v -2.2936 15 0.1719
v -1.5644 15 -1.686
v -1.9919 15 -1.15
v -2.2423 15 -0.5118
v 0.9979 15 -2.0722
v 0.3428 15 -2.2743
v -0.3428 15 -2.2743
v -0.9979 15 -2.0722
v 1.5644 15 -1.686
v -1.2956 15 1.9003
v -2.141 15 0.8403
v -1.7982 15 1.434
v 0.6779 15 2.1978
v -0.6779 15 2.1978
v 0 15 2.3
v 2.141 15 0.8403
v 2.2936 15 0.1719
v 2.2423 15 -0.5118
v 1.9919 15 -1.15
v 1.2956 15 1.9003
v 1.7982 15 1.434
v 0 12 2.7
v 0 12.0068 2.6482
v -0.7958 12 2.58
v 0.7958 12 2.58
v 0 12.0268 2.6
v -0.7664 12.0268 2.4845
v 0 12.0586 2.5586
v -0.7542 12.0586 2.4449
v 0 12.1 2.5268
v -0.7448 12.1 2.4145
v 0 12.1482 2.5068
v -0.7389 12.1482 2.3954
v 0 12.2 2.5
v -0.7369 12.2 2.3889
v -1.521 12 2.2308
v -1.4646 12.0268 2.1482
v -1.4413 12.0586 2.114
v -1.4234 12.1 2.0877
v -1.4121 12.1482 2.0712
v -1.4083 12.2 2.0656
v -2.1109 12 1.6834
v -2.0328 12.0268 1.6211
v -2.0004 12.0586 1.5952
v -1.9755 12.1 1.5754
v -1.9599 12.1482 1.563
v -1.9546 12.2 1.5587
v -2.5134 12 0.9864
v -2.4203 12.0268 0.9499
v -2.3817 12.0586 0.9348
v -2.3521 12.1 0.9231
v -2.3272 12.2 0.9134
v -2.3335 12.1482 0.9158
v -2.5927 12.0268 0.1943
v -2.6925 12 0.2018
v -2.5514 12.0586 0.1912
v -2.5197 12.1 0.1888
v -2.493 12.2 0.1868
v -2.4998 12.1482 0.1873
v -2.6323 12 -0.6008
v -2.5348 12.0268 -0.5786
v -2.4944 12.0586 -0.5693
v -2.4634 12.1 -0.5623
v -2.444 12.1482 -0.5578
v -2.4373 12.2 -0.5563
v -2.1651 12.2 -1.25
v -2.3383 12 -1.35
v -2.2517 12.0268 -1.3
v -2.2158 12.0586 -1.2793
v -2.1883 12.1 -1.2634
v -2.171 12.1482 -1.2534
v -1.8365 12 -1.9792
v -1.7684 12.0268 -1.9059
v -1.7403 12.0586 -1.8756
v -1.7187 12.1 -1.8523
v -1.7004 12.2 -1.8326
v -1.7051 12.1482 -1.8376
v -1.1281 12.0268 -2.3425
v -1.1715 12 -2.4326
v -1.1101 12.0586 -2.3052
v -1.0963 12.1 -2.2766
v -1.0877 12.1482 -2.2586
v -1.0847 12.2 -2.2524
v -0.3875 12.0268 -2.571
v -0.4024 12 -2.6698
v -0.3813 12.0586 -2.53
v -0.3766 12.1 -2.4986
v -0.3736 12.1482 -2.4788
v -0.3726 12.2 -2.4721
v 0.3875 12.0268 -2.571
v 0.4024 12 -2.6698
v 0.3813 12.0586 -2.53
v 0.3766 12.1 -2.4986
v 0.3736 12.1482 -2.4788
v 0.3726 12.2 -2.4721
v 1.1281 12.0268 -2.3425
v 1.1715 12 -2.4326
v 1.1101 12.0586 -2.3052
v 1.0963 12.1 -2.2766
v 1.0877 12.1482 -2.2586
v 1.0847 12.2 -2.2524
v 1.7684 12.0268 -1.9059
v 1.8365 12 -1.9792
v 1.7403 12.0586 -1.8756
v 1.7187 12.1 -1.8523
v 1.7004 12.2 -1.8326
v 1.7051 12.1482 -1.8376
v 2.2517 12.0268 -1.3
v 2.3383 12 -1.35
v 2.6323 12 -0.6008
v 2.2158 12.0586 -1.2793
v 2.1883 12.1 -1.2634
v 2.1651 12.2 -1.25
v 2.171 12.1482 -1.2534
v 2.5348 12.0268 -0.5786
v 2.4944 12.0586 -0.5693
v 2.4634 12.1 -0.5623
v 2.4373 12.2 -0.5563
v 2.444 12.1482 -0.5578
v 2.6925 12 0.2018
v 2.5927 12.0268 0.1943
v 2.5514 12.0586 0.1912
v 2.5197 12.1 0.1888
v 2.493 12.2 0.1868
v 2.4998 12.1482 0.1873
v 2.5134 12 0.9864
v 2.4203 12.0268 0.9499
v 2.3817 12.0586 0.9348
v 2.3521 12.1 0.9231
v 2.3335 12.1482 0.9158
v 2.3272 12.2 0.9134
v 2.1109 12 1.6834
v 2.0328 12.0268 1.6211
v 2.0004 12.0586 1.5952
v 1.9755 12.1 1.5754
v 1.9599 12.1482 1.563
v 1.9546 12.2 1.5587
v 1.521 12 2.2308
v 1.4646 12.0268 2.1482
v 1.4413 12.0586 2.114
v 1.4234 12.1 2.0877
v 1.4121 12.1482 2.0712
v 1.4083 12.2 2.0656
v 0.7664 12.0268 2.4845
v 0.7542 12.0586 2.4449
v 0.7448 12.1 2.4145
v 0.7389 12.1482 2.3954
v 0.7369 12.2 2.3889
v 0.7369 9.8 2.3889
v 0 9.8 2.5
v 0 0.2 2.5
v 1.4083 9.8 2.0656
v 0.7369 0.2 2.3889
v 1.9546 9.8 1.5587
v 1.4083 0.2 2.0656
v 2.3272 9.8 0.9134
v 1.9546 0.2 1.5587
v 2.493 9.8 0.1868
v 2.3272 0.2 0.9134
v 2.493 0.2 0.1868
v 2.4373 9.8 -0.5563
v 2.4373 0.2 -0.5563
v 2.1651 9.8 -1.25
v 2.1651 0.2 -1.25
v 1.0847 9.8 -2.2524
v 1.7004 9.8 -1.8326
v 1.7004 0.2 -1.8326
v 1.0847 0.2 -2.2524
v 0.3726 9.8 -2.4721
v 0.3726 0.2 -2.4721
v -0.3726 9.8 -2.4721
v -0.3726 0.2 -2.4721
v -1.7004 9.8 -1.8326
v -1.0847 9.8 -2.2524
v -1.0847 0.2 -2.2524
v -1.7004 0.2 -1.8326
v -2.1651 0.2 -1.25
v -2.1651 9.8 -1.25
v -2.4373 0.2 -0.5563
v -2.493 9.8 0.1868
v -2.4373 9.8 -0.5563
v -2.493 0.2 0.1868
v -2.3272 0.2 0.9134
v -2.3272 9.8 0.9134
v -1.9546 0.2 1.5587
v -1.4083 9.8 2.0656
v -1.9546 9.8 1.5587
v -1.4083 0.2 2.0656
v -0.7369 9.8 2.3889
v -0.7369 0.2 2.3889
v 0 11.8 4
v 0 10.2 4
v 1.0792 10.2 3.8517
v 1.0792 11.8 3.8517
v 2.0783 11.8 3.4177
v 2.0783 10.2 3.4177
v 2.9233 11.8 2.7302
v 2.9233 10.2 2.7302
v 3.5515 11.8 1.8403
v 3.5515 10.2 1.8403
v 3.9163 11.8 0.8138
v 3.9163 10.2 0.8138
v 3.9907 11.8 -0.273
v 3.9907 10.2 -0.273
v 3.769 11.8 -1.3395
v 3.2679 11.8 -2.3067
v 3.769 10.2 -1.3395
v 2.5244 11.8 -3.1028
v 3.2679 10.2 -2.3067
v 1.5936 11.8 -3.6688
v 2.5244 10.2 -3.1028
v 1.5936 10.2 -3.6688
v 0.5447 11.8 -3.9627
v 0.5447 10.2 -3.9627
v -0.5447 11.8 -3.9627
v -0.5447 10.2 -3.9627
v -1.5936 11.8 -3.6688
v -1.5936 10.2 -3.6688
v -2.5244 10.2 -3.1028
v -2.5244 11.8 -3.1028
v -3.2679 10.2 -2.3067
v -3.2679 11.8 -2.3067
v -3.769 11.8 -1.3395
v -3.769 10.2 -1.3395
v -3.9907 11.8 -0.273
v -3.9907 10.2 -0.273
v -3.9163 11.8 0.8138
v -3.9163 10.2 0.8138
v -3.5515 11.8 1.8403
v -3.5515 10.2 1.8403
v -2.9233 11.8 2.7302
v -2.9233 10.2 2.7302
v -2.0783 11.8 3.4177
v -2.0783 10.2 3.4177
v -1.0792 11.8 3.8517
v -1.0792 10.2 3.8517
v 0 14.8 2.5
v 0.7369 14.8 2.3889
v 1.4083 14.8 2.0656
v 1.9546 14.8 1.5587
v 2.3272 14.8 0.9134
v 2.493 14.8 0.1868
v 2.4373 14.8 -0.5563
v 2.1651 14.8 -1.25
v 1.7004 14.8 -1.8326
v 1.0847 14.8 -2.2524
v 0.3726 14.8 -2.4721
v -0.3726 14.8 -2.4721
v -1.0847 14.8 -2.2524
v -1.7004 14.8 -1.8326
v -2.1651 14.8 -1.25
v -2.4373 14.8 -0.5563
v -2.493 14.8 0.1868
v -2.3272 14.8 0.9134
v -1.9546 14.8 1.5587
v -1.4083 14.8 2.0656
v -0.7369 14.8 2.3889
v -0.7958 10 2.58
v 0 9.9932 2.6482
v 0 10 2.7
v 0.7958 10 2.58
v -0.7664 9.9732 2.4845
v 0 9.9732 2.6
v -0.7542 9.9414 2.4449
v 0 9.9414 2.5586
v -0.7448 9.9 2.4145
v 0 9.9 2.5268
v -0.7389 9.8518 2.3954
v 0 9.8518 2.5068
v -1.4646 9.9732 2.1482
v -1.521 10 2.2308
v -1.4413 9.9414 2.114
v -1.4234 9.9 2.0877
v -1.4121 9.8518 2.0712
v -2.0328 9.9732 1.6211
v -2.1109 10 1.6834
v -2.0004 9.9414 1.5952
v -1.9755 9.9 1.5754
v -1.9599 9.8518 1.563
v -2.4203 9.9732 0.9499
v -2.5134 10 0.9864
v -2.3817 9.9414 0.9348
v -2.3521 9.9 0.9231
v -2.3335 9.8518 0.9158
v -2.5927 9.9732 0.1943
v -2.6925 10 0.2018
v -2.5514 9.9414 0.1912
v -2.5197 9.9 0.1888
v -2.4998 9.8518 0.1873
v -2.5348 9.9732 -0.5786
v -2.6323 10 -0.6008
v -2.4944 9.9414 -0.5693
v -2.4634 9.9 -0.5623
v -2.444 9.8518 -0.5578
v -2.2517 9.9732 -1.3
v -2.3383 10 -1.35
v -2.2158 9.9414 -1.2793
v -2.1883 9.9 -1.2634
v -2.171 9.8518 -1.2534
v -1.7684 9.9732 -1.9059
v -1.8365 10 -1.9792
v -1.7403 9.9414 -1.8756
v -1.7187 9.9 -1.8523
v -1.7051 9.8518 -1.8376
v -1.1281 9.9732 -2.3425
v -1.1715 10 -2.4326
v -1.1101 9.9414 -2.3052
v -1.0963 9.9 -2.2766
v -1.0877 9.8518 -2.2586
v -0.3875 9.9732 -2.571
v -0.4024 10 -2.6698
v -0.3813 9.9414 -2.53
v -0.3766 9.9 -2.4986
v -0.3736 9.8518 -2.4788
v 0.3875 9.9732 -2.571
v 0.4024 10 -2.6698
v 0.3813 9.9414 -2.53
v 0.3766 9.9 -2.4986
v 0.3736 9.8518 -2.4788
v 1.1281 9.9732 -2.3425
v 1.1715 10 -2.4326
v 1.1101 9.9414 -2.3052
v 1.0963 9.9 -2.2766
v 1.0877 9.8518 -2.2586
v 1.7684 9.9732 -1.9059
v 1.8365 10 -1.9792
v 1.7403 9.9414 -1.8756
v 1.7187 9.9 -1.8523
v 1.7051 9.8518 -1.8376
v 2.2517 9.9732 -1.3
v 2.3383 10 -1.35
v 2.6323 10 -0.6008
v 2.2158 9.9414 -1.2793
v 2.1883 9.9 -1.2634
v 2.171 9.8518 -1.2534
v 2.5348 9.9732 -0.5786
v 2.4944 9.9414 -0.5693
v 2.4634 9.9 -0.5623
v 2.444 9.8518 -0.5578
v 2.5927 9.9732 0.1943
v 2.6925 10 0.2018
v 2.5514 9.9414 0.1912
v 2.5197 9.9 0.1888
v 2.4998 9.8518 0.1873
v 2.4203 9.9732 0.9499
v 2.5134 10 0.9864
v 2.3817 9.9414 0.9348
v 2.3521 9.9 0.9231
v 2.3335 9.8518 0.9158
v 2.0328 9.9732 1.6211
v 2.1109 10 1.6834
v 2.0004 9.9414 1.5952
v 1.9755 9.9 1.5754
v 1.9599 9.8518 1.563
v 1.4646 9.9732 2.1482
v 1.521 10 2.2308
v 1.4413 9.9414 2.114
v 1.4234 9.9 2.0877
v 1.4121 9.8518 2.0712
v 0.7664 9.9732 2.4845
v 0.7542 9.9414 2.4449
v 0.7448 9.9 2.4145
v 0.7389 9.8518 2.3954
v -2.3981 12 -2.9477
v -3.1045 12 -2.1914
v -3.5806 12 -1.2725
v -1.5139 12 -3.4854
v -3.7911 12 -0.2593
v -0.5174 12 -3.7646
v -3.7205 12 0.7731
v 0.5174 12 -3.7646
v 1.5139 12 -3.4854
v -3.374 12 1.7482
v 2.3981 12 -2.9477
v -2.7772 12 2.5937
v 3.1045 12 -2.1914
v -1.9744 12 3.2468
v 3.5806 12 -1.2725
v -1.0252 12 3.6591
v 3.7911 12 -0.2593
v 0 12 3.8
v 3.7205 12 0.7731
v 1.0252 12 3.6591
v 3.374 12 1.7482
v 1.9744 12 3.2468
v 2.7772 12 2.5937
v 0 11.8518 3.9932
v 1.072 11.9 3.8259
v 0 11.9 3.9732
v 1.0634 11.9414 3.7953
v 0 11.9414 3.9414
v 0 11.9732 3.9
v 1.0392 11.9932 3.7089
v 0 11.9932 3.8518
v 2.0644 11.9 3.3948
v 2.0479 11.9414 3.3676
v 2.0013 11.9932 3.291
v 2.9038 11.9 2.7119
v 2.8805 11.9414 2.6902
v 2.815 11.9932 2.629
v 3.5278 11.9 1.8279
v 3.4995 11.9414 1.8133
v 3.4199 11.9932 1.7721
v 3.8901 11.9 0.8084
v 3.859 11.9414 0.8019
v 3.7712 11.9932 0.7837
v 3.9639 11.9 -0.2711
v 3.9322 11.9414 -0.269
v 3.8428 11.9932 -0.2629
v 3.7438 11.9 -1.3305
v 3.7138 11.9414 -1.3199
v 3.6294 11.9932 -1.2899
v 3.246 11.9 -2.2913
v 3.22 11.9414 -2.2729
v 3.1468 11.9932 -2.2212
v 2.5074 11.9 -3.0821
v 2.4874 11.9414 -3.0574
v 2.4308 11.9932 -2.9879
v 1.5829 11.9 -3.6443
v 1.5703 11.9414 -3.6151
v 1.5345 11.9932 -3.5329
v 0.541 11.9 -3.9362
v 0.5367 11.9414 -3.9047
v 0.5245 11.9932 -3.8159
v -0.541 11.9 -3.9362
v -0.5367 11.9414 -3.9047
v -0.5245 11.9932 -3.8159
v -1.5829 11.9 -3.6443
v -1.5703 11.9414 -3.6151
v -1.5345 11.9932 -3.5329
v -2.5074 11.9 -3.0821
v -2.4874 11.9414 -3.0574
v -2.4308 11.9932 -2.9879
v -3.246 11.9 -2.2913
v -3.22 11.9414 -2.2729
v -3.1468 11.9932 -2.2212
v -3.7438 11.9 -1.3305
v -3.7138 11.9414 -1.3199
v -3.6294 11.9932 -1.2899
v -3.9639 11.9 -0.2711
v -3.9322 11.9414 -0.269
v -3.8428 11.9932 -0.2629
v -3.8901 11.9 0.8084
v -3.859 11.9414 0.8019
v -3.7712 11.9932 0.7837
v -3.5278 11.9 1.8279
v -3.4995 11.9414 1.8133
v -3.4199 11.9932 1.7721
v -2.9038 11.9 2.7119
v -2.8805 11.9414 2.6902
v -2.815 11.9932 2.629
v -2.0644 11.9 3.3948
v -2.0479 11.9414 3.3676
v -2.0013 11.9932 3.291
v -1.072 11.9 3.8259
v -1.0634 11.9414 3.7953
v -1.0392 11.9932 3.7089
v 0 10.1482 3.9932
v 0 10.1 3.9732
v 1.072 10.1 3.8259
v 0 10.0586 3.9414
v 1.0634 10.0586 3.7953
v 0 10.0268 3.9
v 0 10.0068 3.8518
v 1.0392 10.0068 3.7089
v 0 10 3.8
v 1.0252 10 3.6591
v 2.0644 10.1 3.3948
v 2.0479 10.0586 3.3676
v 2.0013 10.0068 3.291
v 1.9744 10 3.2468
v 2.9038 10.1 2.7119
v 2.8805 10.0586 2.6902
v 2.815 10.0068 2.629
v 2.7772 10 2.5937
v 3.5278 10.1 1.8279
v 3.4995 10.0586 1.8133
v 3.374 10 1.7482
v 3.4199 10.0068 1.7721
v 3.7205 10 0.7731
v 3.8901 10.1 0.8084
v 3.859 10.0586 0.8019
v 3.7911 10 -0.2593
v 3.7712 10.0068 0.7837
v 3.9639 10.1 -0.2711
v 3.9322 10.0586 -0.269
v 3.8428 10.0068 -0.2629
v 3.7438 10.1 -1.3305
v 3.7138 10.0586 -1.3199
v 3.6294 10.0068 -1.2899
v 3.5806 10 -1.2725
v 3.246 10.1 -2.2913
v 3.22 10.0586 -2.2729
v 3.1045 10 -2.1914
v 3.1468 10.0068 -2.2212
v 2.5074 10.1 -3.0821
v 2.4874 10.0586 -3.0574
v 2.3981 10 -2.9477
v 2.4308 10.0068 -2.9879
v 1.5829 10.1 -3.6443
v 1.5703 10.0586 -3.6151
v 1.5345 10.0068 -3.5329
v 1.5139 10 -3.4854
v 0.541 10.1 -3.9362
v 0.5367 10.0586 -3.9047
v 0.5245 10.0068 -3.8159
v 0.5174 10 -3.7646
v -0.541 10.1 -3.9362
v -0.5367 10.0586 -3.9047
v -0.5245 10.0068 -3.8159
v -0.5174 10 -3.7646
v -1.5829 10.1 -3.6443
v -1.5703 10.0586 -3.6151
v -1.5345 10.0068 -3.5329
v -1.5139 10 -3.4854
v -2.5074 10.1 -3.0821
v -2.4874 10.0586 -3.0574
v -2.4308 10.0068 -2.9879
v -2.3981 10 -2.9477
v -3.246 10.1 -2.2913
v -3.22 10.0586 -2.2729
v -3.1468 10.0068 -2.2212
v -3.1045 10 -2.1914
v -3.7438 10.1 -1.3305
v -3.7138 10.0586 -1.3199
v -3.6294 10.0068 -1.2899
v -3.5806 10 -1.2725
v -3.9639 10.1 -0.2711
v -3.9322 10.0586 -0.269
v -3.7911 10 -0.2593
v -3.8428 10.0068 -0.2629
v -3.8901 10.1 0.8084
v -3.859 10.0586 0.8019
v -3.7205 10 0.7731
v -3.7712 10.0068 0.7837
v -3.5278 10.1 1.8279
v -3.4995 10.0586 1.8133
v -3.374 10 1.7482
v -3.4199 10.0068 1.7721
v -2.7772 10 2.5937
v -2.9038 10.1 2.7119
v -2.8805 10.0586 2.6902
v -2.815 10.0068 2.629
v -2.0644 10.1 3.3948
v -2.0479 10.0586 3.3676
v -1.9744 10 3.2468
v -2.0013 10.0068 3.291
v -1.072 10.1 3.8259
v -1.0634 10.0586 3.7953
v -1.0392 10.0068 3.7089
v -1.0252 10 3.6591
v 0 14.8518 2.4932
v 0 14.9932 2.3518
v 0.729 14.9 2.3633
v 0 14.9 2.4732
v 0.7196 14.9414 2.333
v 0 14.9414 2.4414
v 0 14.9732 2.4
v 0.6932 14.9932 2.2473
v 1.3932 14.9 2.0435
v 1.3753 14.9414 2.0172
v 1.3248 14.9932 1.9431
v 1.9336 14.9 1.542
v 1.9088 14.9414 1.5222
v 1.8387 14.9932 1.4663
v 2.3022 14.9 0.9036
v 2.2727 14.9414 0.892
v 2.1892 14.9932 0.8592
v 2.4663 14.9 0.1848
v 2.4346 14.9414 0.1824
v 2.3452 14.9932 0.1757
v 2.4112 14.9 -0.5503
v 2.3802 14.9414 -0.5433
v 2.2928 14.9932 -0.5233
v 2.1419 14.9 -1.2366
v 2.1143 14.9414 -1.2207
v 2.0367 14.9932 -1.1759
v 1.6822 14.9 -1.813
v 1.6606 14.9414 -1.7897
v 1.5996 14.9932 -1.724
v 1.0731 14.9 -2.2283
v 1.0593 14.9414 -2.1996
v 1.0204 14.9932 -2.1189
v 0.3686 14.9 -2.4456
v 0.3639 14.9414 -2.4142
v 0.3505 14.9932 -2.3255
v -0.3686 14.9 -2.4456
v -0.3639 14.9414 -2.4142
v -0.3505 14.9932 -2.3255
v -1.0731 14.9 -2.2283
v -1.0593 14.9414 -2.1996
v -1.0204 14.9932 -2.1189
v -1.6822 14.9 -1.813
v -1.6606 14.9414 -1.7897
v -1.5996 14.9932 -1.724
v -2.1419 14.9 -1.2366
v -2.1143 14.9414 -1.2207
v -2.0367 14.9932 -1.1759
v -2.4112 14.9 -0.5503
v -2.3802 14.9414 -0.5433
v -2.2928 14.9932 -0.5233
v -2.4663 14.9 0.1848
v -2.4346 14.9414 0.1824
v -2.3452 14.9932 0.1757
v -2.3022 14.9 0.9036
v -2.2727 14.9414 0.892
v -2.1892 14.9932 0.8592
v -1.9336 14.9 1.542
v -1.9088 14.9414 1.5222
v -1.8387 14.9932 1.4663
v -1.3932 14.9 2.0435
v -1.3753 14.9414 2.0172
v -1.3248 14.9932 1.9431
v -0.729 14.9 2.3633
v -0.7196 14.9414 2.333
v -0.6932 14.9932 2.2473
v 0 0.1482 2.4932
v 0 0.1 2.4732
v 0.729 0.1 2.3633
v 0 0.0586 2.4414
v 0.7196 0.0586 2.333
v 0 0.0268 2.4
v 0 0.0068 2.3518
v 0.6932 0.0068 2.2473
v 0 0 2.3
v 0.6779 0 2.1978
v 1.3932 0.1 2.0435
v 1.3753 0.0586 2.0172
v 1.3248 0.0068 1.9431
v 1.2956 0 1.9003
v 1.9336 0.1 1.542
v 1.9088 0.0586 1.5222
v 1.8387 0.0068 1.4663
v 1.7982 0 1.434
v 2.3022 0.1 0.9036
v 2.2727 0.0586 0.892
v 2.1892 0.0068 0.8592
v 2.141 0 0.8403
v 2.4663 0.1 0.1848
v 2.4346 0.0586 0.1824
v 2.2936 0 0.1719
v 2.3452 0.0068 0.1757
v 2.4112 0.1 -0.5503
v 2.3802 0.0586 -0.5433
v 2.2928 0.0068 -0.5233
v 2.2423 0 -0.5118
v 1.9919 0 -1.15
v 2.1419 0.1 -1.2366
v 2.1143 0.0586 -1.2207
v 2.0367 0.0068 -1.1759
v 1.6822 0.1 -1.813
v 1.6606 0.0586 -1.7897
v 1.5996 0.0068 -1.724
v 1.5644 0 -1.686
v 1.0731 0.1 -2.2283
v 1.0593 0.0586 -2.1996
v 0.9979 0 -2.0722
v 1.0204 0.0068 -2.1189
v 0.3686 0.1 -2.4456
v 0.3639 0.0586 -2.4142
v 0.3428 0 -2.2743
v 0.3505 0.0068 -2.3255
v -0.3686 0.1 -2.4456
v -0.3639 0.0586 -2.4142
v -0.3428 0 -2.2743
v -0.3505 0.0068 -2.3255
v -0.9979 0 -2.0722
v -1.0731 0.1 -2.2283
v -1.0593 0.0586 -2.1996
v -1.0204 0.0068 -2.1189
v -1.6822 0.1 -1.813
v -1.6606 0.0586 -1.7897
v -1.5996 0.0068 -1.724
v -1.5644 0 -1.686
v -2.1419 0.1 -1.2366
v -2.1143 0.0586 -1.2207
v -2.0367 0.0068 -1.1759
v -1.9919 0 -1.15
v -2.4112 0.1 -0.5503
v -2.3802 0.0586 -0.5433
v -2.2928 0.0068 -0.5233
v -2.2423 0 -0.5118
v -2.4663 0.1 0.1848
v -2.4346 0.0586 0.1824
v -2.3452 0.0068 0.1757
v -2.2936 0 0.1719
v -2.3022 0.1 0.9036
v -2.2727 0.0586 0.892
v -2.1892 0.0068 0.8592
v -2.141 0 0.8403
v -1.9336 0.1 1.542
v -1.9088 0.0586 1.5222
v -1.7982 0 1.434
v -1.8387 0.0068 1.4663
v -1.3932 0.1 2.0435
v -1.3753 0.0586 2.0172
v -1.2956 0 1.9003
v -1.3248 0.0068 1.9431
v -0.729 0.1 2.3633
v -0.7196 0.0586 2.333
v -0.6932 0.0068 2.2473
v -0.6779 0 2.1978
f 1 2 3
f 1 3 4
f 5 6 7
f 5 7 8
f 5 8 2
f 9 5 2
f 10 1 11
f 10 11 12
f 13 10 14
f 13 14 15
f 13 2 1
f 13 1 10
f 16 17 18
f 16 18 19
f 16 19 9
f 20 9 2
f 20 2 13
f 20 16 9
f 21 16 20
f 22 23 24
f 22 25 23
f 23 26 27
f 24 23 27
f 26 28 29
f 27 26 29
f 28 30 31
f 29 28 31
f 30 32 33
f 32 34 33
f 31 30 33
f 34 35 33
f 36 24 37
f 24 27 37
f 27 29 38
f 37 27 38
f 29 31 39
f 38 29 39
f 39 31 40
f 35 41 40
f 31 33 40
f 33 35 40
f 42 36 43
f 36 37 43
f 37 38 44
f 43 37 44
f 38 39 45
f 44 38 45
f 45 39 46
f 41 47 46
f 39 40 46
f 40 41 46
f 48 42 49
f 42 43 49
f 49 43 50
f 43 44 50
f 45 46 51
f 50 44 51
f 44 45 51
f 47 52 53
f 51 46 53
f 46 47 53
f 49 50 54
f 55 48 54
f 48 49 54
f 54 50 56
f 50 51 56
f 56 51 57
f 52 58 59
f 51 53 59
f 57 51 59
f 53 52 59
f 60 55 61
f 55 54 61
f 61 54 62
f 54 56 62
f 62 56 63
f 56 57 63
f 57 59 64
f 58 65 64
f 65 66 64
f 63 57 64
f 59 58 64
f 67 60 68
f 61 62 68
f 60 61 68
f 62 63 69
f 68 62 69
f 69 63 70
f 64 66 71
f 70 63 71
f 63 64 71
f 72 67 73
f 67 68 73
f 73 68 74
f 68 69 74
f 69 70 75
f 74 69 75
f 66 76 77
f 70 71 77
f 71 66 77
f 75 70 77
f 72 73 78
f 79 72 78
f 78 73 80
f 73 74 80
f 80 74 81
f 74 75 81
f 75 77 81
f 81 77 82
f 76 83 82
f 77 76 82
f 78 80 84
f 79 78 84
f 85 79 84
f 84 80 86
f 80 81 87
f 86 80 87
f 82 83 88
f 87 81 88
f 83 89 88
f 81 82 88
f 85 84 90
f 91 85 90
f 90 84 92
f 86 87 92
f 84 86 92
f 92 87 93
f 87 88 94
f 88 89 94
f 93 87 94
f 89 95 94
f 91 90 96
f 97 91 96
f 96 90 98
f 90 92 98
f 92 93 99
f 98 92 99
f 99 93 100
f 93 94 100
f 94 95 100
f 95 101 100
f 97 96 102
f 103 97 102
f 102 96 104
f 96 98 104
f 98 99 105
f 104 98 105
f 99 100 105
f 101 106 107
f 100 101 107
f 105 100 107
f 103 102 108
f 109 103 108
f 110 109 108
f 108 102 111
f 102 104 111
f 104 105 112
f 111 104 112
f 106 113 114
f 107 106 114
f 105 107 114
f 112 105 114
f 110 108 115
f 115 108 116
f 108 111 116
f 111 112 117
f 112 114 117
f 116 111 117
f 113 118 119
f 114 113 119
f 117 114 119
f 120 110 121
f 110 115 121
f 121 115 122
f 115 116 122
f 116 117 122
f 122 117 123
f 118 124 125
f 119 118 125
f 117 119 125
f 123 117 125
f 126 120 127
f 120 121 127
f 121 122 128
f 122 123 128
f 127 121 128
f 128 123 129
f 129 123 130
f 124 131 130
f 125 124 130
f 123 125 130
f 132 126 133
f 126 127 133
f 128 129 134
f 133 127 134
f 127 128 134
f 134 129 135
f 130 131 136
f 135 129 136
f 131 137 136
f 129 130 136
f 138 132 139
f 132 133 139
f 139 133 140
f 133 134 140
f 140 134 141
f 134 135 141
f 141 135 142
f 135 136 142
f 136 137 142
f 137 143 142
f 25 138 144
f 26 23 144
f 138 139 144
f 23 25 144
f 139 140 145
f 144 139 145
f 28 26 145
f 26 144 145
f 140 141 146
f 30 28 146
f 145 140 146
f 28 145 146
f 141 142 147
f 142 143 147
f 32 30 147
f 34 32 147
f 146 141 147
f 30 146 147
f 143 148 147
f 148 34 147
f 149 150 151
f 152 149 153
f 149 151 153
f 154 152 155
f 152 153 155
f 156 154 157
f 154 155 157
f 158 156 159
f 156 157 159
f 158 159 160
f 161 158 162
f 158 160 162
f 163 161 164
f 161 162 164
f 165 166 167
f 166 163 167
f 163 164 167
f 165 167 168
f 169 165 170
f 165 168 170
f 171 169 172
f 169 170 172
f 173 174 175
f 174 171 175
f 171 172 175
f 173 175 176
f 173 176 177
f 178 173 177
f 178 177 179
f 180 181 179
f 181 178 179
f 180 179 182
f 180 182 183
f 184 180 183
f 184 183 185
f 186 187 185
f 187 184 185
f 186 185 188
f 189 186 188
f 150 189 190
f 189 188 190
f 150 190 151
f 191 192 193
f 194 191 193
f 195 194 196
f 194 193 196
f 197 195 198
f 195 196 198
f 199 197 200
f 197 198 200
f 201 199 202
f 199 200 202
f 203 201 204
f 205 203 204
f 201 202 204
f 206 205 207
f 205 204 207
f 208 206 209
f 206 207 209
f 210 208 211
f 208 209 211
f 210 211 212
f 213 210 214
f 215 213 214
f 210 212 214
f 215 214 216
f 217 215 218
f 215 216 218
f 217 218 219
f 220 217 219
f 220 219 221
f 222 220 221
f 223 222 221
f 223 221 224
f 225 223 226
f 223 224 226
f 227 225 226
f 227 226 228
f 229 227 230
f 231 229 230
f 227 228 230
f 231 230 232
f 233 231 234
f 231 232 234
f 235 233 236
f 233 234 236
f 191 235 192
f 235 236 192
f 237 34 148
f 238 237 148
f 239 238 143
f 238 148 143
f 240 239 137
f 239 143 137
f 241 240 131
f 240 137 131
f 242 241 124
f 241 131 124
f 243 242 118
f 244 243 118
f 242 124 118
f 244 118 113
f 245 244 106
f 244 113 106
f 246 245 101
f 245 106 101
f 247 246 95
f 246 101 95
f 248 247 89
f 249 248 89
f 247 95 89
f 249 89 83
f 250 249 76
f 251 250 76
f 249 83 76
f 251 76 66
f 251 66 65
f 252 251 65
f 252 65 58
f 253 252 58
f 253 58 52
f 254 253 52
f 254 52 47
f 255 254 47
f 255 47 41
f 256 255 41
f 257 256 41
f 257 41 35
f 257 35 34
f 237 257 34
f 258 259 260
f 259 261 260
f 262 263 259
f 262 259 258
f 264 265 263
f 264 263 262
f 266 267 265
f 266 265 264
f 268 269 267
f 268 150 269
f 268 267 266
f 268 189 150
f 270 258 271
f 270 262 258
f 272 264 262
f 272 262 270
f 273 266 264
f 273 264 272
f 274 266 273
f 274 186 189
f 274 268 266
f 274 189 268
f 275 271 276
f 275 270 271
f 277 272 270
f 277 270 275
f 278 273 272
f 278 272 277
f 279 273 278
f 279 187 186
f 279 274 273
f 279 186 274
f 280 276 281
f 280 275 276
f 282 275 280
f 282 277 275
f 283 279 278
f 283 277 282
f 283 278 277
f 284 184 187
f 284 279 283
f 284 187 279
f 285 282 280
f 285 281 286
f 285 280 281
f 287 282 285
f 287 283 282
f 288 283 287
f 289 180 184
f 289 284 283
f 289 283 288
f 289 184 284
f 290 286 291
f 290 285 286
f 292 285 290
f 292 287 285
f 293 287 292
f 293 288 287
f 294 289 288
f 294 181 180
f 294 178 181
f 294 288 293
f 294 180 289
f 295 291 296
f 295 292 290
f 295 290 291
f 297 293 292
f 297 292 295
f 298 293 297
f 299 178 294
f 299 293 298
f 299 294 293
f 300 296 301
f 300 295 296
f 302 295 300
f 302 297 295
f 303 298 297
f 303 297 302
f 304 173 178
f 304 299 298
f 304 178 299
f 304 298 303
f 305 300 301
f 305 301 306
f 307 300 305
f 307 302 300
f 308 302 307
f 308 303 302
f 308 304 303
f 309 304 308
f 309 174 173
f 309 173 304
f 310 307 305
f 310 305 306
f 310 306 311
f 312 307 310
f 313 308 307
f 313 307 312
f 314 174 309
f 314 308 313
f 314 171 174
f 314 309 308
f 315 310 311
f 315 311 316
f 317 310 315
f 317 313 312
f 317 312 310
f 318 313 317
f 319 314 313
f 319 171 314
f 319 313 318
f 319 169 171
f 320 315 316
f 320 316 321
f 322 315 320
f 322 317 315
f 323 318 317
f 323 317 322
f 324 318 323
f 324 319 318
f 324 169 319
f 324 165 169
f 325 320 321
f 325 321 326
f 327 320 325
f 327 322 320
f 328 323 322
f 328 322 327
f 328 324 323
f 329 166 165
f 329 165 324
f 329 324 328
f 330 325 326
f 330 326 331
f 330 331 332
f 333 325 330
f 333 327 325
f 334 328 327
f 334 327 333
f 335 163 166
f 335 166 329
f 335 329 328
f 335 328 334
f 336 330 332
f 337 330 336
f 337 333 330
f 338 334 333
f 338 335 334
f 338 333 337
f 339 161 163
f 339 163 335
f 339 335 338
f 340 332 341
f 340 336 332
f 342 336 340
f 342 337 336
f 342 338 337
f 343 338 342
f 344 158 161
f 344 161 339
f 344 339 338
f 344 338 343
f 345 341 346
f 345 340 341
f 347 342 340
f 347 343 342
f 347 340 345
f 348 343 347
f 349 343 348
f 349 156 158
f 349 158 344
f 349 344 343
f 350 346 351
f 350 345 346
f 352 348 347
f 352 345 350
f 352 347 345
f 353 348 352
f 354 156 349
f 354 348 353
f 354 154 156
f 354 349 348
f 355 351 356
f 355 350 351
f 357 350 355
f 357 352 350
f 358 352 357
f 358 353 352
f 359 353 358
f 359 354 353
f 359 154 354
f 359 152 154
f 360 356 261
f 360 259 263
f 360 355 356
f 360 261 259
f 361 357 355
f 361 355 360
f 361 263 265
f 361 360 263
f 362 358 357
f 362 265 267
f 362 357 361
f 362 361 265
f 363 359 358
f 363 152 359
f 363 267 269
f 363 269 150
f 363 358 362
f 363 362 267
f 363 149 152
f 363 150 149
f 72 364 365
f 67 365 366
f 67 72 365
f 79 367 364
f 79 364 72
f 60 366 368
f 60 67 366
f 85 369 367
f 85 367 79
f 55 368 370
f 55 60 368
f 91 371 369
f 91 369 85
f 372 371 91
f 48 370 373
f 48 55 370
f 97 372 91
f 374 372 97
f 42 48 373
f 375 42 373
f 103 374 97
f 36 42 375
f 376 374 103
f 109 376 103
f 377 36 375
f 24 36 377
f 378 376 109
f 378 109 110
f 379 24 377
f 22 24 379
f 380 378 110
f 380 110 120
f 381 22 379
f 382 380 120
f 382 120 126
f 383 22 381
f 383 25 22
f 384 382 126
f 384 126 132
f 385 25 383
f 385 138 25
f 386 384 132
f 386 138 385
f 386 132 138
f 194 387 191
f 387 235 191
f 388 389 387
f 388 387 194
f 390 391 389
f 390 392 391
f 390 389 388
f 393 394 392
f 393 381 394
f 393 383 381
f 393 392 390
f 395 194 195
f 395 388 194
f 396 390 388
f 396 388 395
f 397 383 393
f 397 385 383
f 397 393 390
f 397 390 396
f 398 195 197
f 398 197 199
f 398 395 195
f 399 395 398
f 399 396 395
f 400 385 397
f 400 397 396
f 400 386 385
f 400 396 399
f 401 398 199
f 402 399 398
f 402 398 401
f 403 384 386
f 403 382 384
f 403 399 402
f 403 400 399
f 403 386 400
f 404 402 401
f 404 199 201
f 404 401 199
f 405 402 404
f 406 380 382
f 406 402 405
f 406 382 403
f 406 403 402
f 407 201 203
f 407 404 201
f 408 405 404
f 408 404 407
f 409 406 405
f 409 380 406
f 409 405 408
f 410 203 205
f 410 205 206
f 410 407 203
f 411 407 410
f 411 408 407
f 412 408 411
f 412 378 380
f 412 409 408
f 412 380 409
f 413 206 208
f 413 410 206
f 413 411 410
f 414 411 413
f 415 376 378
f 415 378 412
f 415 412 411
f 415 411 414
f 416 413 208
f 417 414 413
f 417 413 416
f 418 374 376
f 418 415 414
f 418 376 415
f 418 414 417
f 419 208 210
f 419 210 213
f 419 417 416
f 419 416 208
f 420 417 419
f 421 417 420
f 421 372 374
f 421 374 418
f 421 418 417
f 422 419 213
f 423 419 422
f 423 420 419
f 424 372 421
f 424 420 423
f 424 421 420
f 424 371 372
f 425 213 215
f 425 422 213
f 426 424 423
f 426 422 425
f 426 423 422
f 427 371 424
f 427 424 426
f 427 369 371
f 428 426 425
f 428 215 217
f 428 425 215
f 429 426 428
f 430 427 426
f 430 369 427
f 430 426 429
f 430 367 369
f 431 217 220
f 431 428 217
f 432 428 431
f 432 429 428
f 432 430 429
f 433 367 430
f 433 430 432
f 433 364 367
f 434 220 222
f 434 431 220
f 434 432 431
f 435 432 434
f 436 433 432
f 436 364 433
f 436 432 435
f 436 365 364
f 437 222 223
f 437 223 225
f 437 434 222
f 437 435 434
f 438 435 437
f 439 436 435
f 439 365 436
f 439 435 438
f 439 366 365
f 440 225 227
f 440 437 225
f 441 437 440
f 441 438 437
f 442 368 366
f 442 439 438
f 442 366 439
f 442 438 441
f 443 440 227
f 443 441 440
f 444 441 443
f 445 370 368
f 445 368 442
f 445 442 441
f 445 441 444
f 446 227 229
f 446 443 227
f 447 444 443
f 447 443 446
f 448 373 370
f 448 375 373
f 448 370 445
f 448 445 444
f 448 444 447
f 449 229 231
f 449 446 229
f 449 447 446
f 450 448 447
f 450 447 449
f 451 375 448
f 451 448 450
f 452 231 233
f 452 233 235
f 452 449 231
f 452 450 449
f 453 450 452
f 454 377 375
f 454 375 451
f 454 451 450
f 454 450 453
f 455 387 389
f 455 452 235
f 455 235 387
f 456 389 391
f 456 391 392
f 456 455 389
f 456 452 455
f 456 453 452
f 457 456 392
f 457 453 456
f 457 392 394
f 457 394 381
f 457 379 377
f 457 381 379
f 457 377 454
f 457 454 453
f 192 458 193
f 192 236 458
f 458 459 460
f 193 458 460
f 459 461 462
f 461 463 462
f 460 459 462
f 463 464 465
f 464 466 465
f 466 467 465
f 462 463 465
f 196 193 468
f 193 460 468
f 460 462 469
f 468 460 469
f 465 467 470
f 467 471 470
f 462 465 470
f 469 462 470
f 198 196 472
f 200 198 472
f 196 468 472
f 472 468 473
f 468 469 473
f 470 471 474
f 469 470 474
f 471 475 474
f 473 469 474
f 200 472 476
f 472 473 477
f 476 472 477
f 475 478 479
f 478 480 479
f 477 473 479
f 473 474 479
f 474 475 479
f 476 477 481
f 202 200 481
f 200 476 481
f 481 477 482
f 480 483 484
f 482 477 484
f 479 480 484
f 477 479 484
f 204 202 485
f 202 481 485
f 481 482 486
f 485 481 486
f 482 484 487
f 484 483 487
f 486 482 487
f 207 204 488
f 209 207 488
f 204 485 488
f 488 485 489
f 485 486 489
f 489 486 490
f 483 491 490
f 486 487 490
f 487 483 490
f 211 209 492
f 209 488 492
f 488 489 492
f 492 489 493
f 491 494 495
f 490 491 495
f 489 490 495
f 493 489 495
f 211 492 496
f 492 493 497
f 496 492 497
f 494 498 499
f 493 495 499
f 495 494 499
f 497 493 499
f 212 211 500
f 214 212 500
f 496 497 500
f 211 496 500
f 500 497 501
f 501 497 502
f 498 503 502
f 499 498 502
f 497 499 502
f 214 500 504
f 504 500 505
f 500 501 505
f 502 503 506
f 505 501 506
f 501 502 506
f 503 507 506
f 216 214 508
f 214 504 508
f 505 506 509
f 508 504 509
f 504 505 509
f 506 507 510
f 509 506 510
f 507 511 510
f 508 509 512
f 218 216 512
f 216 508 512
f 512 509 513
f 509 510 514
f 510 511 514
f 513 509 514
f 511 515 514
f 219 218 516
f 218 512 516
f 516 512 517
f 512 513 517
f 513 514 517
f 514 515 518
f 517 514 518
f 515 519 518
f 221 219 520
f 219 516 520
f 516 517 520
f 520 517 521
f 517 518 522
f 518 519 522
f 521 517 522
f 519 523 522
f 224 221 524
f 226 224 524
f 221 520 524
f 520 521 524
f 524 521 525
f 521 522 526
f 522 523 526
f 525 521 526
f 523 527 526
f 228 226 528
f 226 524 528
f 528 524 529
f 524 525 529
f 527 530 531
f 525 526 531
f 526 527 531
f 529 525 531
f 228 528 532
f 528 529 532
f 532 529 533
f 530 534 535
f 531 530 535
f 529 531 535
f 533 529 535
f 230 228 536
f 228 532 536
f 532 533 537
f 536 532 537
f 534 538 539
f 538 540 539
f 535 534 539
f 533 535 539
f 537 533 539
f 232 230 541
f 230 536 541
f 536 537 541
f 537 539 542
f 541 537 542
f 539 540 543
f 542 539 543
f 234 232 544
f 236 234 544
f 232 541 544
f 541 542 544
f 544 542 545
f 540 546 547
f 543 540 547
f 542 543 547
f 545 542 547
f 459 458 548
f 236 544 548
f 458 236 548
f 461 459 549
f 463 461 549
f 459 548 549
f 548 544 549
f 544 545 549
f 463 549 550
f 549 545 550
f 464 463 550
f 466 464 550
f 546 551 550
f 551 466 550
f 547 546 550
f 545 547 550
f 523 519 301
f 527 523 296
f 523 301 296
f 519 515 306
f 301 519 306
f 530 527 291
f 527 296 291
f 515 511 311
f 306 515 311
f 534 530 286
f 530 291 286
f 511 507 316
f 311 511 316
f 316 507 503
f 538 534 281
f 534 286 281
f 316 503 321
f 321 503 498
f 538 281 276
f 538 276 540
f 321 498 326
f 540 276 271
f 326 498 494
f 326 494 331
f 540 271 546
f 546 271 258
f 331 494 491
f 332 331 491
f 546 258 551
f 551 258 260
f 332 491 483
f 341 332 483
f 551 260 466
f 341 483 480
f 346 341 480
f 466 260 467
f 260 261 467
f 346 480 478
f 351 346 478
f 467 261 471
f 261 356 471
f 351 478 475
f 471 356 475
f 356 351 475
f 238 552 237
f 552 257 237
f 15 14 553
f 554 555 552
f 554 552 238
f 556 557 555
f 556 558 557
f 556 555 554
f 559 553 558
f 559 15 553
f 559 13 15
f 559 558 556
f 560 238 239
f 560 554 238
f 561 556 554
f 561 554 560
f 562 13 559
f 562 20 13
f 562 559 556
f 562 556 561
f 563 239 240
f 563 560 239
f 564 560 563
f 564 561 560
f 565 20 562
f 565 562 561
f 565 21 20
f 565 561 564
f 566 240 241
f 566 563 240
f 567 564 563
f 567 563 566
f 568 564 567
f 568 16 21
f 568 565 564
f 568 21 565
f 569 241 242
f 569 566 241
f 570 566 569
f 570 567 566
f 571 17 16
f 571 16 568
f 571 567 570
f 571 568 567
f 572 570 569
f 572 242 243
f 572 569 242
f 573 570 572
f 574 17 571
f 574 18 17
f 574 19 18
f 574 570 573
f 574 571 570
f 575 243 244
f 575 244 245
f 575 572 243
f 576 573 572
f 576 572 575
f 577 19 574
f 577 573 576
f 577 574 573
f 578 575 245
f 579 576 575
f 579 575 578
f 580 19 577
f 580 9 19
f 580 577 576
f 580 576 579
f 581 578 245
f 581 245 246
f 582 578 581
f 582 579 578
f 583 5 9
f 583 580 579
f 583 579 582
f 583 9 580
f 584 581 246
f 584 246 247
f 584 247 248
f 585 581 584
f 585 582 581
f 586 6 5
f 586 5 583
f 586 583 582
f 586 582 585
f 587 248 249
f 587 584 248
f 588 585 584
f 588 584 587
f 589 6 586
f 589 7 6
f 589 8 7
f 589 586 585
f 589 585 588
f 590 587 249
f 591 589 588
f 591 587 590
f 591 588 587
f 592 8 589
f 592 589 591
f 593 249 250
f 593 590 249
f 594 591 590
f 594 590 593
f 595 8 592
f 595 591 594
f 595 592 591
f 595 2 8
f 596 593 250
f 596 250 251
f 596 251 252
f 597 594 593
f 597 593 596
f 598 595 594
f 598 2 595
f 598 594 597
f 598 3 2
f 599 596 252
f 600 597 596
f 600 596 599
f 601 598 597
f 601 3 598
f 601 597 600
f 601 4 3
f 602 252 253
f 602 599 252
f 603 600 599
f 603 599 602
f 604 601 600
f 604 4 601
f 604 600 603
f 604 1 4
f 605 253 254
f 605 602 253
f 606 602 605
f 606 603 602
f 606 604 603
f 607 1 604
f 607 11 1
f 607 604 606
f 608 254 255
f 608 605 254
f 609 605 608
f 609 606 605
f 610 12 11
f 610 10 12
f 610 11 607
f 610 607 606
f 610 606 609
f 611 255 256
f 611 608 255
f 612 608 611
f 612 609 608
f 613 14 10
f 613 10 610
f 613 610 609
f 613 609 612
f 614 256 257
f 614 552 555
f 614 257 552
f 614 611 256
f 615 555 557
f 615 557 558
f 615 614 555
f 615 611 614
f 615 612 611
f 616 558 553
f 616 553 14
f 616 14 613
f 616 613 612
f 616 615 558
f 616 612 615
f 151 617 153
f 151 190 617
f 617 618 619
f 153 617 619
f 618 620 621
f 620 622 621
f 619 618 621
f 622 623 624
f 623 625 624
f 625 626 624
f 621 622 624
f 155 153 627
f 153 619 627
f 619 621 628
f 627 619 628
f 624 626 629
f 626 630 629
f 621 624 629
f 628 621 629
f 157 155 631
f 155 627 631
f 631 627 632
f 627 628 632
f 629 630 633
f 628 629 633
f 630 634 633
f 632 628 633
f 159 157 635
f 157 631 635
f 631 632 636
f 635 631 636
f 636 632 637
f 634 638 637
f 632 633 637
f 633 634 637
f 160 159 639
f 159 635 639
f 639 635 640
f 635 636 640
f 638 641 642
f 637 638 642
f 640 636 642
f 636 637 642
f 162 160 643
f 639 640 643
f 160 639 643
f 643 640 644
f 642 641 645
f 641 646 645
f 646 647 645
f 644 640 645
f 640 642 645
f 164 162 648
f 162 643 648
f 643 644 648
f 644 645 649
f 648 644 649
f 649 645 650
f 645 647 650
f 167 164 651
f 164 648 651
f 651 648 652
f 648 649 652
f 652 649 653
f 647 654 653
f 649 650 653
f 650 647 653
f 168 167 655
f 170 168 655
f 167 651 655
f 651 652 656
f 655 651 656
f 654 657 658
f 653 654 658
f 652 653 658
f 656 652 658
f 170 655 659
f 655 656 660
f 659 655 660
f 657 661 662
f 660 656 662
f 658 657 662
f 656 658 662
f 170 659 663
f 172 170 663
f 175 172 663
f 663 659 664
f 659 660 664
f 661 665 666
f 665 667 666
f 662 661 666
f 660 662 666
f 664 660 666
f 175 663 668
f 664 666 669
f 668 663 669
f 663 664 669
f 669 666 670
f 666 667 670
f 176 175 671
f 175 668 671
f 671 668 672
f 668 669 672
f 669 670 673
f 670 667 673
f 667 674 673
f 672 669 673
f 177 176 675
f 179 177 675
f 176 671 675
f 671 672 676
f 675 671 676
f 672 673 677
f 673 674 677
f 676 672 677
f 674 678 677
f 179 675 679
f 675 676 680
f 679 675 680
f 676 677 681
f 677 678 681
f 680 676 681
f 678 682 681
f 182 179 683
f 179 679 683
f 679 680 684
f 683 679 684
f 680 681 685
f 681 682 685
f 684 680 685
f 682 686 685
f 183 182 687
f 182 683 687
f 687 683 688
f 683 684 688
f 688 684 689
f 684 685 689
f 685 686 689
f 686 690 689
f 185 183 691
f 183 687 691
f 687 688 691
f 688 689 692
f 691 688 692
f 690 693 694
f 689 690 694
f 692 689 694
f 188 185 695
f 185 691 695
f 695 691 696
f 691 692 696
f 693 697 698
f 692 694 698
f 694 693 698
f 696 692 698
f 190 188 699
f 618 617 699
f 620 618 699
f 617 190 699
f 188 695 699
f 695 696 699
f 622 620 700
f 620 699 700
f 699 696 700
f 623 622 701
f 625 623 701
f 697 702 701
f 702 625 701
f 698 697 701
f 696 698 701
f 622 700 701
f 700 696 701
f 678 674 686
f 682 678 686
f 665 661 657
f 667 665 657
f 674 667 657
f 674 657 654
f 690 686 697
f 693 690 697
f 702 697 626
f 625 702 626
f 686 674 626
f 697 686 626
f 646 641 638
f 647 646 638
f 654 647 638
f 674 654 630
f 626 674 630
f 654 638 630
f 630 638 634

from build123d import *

# Parameters (mm, degrees)
SKETCH1_R           = 2.5
BOSS_EXTRUDE1_DEPTH = 15
SKETCH2_R           = 4
BOSS_EXTRUDE2_DEPTH = 2
FILLET1_R           = 0.2


with BuildPart() as part:
    # Sketch1 → Boss-Extrude1 (new body)
    with BuildSketch(Plane(origin=(0, 0, 0), x_dir=(1, 0, 0), z_dir=(0, 1, 0))):
        with Locations(Location((0, 0, 0), (0, 0, 270))):
            Circle(SKETCH1_R)
    extrude(amount=BOSS_EXTRUDE1_DEPTH)

    # Sketch2 → Boss-Extrude2 (add)
    with BuildSketch(Plane(origin=(0, 10, 0), x_dir=(1, 0, 0), z_dir=(0, 1, 0))):
        with Locations(Location((0, 0, 0), (0, 0, 270))):
            Circle(SKETCH2_R)
    extrude(amount=BOSS_EXTRUDE2_DEPTH)

    # Fillet1
    fillet1_edges = [part.edges().sort_by_distance(p)[0] for p in [
        (0, 0, -2.5),
        (0, 15, -2.5),
        (0, 10, -2.5),
        (0, 12, -2.5),
        (0, 10, -4),
        (0, 12, -4),
    ]]
    fillet(fillet1_edges, radius=FILLET1_R)


solid = part.part
